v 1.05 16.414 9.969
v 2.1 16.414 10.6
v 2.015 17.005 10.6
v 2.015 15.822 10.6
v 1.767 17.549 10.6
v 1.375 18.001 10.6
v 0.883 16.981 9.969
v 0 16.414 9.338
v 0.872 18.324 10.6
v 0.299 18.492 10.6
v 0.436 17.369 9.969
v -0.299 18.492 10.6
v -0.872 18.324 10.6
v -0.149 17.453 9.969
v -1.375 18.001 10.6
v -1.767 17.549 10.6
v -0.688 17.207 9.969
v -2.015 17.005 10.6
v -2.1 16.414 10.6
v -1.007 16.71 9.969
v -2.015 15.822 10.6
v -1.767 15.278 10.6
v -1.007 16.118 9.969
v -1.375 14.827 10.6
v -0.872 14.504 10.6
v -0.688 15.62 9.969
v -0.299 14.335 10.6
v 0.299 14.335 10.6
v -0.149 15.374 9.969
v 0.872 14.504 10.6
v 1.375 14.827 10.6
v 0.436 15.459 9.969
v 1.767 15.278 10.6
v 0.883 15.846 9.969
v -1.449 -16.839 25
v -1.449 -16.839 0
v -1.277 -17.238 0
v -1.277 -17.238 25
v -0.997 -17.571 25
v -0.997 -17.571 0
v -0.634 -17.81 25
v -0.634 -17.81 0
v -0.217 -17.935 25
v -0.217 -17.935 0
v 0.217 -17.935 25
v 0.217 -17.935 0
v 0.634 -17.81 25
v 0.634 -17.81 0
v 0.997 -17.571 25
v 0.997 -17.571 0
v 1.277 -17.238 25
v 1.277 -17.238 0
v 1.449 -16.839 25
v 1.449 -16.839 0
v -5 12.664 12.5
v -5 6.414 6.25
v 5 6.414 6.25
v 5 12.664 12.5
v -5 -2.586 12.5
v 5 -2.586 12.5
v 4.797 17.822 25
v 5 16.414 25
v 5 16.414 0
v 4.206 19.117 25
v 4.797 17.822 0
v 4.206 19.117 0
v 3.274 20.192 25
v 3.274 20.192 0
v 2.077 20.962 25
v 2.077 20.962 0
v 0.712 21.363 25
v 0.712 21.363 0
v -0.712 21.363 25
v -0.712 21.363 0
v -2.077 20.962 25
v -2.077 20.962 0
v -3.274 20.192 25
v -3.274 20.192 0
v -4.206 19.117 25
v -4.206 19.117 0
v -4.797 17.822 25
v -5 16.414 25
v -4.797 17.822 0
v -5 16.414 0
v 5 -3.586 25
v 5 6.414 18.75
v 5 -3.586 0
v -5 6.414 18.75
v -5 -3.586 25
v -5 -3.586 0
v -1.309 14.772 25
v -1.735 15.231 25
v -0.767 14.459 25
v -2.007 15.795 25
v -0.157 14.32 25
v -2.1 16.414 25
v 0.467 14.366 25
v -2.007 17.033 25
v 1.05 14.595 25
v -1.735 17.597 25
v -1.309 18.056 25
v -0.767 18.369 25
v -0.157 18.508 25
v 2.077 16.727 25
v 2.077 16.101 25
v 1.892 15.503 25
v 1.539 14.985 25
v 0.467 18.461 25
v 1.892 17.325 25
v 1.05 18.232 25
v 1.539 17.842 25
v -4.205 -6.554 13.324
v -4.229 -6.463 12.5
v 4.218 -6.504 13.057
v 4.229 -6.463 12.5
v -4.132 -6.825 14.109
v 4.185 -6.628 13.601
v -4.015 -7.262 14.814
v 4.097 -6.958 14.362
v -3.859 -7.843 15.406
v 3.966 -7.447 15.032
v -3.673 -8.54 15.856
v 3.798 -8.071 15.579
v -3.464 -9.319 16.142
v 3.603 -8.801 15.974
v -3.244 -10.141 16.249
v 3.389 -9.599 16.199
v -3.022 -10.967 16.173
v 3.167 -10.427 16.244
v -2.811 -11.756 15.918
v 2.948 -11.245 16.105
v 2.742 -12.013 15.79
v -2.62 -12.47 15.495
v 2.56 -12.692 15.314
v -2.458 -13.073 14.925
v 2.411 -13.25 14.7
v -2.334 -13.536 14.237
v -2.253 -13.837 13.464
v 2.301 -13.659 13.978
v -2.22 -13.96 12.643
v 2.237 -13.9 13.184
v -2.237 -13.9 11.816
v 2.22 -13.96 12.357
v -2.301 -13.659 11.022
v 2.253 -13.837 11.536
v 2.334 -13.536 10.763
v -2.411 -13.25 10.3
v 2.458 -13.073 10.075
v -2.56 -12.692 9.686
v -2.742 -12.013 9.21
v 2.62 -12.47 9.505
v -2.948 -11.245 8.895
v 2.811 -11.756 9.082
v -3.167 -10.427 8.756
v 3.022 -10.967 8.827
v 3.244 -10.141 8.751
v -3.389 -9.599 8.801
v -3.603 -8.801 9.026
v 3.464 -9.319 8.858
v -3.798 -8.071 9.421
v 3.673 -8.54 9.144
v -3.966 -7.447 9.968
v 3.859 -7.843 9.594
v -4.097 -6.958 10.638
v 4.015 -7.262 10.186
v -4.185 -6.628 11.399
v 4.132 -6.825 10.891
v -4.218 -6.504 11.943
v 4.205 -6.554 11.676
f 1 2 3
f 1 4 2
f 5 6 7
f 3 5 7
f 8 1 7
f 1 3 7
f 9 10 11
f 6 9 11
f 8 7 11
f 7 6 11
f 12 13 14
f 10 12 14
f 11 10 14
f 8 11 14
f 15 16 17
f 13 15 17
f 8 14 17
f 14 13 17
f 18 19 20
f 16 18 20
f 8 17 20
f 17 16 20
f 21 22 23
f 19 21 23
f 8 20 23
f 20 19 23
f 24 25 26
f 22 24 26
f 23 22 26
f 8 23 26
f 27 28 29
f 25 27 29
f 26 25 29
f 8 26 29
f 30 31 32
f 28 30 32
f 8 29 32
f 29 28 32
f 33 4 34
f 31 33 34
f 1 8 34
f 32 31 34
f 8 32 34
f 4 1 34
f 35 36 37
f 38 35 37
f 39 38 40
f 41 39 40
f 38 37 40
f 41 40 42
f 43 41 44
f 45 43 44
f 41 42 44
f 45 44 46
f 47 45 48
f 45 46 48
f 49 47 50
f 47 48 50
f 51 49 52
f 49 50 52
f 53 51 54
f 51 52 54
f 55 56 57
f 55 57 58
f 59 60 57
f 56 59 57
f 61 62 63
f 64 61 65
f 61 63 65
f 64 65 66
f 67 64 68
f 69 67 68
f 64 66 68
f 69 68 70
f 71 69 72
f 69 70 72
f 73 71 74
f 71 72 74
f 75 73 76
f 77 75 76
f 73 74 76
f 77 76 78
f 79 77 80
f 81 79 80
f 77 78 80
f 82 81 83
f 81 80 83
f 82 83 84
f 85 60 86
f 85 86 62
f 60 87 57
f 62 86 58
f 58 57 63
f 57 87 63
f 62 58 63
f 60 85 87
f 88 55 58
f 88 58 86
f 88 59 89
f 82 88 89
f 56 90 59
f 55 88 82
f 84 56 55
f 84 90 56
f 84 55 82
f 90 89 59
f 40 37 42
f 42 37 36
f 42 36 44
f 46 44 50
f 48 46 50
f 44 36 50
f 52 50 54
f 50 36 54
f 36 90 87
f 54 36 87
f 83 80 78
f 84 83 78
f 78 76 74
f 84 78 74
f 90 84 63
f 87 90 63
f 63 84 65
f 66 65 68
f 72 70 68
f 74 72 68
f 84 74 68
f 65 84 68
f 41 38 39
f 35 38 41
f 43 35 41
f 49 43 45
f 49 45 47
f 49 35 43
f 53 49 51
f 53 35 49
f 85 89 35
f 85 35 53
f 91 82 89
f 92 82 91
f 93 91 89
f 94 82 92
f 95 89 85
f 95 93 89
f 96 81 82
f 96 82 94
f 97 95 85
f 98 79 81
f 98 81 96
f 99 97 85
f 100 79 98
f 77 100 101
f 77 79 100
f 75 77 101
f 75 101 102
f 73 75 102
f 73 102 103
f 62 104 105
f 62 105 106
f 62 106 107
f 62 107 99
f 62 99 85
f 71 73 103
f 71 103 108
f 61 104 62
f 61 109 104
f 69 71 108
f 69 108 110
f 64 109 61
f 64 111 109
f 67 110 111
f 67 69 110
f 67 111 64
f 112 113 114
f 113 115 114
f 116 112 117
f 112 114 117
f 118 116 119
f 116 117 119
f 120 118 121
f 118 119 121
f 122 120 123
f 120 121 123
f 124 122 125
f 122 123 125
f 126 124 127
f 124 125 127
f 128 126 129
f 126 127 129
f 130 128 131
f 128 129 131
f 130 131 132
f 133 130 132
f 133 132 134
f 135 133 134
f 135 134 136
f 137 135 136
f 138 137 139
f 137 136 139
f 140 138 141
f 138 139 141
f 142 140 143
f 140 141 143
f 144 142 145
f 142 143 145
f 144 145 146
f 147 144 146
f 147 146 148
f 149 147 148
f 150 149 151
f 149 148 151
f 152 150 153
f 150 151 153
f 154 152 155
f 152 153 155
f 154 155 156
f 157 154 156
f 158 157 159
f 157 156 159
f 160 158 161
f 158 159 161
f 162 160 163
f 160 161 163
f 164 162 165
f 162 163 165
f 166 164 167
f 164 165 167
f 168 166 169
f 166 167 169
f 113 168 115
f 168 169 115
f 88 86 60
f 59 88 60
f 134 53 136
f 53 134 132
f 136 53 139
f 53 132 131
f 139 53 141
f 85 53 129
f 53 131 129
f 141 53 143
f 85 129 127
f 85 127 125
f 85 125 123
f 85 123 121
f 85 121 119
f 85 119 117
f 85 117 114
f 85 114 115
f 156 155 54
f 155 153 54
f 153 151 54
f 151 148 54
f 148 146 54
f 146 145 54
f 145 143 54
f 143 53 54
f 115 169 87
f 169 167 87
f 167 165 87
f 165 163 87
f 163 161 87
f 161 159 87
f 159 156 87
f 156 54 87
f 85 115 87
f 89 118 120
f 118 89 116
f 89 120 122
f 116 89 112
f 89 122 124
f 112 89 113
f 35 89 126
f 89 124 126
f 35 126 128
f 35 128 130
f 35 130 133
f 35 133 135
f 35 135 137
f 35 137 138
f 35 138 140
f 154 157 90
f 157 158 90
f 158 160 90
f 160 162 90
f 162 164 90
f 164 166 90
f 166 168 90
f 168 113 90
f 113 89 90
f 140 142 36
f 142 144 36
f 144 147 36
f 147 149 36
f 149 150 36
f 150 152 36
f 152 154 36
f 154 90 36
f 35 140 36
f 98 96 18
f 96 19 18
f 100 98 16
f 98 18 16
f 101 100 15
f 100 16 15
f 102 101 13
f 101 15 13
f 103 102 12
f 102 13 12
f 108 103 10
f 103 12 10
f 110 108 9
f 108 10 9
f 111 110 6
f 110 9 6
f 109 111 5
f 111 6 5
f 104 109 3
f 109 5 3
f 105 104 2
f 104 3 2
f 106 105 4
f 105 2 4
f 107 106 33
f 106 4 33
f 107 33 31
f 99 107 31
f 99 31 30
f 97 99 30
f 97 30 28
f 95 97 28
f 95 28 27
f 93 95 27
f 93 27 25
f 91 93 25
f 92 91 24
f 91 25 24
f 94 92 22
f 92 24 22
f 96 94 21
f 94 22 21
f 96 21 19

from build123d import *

# Parameters (mm, degrees)
F0_W     = 10
F0_H     = 20
F1_DEPTH = 25
F3_DEPTH = 10.001
F4_R     = 3.75
F5_DEPTH = 12.5
F7_D     = 4.2
F7_DEPTH = 14.4
F7_TIP   = 1.2618073


with BuildPart() as f1:
    # F0 (on Top) → F1 (new body)
    with BuildSketch(Plane.XY):
        with BuildLine():
            Line((1.4488887394, -16.8391867264), (5, -3.5862590786))
            Line((5, -3.5862590786), (-5, -3.5862590786))
            Line((-5, -3.5862590786), (-1.4488887394, -16.8391867264))
            ThreePointArc((-1.4488887394, -16.8391867264), (0, -17.9509581587), (1.4488887394, -16.8391867264))
        make_face()
        with Locations((0, 6.4137409214)):
            Rectangle(F0_W, F0_H)
        with BuildLine():
            Line((-5, 16.4137409214), (5, 16.4137409214))
            ThreePointArc((5, 16.4137409214), (0, 21.4137409214), (-5, 16.4137409214))
        make_face()
    extrude(amount=F1_DEPTH)

    # F2 (on face) → F3 (cut, through all)
    with BuildSketch(Plane.YZ.offset(5)):
        Polygon((12.6637409214, 12.5), (6.4137409214, 18.75), (-2.5862590786, 12.5), (6.4137409214, 6.25), align=None)
    extrude(amount=-F3_DEPTH, mode=Mode.SUBTRACT)

    # F4 (on Right) → F5 (cut, symmetric)
    with BuildSketch(Plane.YZ):
        with Locations((-10.2127229025, 12.5)):
            Circle(F4_R)
    extrude(amount=F5_DEPTH, both=True, mode=Mode.SUBTRACT)

    # F7
    with Locations(Plane.XY.offset(25)):
        with Locations((0, 16.4137409214)):
            Hole(F7_D / 2, depth=F7_DEPTH)
            with Locations((0, 0, -(F7_DEPTH + F7_TIP / 2))):  # 118° drill point
                Cone(0, F7_D / 2, F7_TIP, mode=Mode.SUBTRACT)


solid = f1.part
